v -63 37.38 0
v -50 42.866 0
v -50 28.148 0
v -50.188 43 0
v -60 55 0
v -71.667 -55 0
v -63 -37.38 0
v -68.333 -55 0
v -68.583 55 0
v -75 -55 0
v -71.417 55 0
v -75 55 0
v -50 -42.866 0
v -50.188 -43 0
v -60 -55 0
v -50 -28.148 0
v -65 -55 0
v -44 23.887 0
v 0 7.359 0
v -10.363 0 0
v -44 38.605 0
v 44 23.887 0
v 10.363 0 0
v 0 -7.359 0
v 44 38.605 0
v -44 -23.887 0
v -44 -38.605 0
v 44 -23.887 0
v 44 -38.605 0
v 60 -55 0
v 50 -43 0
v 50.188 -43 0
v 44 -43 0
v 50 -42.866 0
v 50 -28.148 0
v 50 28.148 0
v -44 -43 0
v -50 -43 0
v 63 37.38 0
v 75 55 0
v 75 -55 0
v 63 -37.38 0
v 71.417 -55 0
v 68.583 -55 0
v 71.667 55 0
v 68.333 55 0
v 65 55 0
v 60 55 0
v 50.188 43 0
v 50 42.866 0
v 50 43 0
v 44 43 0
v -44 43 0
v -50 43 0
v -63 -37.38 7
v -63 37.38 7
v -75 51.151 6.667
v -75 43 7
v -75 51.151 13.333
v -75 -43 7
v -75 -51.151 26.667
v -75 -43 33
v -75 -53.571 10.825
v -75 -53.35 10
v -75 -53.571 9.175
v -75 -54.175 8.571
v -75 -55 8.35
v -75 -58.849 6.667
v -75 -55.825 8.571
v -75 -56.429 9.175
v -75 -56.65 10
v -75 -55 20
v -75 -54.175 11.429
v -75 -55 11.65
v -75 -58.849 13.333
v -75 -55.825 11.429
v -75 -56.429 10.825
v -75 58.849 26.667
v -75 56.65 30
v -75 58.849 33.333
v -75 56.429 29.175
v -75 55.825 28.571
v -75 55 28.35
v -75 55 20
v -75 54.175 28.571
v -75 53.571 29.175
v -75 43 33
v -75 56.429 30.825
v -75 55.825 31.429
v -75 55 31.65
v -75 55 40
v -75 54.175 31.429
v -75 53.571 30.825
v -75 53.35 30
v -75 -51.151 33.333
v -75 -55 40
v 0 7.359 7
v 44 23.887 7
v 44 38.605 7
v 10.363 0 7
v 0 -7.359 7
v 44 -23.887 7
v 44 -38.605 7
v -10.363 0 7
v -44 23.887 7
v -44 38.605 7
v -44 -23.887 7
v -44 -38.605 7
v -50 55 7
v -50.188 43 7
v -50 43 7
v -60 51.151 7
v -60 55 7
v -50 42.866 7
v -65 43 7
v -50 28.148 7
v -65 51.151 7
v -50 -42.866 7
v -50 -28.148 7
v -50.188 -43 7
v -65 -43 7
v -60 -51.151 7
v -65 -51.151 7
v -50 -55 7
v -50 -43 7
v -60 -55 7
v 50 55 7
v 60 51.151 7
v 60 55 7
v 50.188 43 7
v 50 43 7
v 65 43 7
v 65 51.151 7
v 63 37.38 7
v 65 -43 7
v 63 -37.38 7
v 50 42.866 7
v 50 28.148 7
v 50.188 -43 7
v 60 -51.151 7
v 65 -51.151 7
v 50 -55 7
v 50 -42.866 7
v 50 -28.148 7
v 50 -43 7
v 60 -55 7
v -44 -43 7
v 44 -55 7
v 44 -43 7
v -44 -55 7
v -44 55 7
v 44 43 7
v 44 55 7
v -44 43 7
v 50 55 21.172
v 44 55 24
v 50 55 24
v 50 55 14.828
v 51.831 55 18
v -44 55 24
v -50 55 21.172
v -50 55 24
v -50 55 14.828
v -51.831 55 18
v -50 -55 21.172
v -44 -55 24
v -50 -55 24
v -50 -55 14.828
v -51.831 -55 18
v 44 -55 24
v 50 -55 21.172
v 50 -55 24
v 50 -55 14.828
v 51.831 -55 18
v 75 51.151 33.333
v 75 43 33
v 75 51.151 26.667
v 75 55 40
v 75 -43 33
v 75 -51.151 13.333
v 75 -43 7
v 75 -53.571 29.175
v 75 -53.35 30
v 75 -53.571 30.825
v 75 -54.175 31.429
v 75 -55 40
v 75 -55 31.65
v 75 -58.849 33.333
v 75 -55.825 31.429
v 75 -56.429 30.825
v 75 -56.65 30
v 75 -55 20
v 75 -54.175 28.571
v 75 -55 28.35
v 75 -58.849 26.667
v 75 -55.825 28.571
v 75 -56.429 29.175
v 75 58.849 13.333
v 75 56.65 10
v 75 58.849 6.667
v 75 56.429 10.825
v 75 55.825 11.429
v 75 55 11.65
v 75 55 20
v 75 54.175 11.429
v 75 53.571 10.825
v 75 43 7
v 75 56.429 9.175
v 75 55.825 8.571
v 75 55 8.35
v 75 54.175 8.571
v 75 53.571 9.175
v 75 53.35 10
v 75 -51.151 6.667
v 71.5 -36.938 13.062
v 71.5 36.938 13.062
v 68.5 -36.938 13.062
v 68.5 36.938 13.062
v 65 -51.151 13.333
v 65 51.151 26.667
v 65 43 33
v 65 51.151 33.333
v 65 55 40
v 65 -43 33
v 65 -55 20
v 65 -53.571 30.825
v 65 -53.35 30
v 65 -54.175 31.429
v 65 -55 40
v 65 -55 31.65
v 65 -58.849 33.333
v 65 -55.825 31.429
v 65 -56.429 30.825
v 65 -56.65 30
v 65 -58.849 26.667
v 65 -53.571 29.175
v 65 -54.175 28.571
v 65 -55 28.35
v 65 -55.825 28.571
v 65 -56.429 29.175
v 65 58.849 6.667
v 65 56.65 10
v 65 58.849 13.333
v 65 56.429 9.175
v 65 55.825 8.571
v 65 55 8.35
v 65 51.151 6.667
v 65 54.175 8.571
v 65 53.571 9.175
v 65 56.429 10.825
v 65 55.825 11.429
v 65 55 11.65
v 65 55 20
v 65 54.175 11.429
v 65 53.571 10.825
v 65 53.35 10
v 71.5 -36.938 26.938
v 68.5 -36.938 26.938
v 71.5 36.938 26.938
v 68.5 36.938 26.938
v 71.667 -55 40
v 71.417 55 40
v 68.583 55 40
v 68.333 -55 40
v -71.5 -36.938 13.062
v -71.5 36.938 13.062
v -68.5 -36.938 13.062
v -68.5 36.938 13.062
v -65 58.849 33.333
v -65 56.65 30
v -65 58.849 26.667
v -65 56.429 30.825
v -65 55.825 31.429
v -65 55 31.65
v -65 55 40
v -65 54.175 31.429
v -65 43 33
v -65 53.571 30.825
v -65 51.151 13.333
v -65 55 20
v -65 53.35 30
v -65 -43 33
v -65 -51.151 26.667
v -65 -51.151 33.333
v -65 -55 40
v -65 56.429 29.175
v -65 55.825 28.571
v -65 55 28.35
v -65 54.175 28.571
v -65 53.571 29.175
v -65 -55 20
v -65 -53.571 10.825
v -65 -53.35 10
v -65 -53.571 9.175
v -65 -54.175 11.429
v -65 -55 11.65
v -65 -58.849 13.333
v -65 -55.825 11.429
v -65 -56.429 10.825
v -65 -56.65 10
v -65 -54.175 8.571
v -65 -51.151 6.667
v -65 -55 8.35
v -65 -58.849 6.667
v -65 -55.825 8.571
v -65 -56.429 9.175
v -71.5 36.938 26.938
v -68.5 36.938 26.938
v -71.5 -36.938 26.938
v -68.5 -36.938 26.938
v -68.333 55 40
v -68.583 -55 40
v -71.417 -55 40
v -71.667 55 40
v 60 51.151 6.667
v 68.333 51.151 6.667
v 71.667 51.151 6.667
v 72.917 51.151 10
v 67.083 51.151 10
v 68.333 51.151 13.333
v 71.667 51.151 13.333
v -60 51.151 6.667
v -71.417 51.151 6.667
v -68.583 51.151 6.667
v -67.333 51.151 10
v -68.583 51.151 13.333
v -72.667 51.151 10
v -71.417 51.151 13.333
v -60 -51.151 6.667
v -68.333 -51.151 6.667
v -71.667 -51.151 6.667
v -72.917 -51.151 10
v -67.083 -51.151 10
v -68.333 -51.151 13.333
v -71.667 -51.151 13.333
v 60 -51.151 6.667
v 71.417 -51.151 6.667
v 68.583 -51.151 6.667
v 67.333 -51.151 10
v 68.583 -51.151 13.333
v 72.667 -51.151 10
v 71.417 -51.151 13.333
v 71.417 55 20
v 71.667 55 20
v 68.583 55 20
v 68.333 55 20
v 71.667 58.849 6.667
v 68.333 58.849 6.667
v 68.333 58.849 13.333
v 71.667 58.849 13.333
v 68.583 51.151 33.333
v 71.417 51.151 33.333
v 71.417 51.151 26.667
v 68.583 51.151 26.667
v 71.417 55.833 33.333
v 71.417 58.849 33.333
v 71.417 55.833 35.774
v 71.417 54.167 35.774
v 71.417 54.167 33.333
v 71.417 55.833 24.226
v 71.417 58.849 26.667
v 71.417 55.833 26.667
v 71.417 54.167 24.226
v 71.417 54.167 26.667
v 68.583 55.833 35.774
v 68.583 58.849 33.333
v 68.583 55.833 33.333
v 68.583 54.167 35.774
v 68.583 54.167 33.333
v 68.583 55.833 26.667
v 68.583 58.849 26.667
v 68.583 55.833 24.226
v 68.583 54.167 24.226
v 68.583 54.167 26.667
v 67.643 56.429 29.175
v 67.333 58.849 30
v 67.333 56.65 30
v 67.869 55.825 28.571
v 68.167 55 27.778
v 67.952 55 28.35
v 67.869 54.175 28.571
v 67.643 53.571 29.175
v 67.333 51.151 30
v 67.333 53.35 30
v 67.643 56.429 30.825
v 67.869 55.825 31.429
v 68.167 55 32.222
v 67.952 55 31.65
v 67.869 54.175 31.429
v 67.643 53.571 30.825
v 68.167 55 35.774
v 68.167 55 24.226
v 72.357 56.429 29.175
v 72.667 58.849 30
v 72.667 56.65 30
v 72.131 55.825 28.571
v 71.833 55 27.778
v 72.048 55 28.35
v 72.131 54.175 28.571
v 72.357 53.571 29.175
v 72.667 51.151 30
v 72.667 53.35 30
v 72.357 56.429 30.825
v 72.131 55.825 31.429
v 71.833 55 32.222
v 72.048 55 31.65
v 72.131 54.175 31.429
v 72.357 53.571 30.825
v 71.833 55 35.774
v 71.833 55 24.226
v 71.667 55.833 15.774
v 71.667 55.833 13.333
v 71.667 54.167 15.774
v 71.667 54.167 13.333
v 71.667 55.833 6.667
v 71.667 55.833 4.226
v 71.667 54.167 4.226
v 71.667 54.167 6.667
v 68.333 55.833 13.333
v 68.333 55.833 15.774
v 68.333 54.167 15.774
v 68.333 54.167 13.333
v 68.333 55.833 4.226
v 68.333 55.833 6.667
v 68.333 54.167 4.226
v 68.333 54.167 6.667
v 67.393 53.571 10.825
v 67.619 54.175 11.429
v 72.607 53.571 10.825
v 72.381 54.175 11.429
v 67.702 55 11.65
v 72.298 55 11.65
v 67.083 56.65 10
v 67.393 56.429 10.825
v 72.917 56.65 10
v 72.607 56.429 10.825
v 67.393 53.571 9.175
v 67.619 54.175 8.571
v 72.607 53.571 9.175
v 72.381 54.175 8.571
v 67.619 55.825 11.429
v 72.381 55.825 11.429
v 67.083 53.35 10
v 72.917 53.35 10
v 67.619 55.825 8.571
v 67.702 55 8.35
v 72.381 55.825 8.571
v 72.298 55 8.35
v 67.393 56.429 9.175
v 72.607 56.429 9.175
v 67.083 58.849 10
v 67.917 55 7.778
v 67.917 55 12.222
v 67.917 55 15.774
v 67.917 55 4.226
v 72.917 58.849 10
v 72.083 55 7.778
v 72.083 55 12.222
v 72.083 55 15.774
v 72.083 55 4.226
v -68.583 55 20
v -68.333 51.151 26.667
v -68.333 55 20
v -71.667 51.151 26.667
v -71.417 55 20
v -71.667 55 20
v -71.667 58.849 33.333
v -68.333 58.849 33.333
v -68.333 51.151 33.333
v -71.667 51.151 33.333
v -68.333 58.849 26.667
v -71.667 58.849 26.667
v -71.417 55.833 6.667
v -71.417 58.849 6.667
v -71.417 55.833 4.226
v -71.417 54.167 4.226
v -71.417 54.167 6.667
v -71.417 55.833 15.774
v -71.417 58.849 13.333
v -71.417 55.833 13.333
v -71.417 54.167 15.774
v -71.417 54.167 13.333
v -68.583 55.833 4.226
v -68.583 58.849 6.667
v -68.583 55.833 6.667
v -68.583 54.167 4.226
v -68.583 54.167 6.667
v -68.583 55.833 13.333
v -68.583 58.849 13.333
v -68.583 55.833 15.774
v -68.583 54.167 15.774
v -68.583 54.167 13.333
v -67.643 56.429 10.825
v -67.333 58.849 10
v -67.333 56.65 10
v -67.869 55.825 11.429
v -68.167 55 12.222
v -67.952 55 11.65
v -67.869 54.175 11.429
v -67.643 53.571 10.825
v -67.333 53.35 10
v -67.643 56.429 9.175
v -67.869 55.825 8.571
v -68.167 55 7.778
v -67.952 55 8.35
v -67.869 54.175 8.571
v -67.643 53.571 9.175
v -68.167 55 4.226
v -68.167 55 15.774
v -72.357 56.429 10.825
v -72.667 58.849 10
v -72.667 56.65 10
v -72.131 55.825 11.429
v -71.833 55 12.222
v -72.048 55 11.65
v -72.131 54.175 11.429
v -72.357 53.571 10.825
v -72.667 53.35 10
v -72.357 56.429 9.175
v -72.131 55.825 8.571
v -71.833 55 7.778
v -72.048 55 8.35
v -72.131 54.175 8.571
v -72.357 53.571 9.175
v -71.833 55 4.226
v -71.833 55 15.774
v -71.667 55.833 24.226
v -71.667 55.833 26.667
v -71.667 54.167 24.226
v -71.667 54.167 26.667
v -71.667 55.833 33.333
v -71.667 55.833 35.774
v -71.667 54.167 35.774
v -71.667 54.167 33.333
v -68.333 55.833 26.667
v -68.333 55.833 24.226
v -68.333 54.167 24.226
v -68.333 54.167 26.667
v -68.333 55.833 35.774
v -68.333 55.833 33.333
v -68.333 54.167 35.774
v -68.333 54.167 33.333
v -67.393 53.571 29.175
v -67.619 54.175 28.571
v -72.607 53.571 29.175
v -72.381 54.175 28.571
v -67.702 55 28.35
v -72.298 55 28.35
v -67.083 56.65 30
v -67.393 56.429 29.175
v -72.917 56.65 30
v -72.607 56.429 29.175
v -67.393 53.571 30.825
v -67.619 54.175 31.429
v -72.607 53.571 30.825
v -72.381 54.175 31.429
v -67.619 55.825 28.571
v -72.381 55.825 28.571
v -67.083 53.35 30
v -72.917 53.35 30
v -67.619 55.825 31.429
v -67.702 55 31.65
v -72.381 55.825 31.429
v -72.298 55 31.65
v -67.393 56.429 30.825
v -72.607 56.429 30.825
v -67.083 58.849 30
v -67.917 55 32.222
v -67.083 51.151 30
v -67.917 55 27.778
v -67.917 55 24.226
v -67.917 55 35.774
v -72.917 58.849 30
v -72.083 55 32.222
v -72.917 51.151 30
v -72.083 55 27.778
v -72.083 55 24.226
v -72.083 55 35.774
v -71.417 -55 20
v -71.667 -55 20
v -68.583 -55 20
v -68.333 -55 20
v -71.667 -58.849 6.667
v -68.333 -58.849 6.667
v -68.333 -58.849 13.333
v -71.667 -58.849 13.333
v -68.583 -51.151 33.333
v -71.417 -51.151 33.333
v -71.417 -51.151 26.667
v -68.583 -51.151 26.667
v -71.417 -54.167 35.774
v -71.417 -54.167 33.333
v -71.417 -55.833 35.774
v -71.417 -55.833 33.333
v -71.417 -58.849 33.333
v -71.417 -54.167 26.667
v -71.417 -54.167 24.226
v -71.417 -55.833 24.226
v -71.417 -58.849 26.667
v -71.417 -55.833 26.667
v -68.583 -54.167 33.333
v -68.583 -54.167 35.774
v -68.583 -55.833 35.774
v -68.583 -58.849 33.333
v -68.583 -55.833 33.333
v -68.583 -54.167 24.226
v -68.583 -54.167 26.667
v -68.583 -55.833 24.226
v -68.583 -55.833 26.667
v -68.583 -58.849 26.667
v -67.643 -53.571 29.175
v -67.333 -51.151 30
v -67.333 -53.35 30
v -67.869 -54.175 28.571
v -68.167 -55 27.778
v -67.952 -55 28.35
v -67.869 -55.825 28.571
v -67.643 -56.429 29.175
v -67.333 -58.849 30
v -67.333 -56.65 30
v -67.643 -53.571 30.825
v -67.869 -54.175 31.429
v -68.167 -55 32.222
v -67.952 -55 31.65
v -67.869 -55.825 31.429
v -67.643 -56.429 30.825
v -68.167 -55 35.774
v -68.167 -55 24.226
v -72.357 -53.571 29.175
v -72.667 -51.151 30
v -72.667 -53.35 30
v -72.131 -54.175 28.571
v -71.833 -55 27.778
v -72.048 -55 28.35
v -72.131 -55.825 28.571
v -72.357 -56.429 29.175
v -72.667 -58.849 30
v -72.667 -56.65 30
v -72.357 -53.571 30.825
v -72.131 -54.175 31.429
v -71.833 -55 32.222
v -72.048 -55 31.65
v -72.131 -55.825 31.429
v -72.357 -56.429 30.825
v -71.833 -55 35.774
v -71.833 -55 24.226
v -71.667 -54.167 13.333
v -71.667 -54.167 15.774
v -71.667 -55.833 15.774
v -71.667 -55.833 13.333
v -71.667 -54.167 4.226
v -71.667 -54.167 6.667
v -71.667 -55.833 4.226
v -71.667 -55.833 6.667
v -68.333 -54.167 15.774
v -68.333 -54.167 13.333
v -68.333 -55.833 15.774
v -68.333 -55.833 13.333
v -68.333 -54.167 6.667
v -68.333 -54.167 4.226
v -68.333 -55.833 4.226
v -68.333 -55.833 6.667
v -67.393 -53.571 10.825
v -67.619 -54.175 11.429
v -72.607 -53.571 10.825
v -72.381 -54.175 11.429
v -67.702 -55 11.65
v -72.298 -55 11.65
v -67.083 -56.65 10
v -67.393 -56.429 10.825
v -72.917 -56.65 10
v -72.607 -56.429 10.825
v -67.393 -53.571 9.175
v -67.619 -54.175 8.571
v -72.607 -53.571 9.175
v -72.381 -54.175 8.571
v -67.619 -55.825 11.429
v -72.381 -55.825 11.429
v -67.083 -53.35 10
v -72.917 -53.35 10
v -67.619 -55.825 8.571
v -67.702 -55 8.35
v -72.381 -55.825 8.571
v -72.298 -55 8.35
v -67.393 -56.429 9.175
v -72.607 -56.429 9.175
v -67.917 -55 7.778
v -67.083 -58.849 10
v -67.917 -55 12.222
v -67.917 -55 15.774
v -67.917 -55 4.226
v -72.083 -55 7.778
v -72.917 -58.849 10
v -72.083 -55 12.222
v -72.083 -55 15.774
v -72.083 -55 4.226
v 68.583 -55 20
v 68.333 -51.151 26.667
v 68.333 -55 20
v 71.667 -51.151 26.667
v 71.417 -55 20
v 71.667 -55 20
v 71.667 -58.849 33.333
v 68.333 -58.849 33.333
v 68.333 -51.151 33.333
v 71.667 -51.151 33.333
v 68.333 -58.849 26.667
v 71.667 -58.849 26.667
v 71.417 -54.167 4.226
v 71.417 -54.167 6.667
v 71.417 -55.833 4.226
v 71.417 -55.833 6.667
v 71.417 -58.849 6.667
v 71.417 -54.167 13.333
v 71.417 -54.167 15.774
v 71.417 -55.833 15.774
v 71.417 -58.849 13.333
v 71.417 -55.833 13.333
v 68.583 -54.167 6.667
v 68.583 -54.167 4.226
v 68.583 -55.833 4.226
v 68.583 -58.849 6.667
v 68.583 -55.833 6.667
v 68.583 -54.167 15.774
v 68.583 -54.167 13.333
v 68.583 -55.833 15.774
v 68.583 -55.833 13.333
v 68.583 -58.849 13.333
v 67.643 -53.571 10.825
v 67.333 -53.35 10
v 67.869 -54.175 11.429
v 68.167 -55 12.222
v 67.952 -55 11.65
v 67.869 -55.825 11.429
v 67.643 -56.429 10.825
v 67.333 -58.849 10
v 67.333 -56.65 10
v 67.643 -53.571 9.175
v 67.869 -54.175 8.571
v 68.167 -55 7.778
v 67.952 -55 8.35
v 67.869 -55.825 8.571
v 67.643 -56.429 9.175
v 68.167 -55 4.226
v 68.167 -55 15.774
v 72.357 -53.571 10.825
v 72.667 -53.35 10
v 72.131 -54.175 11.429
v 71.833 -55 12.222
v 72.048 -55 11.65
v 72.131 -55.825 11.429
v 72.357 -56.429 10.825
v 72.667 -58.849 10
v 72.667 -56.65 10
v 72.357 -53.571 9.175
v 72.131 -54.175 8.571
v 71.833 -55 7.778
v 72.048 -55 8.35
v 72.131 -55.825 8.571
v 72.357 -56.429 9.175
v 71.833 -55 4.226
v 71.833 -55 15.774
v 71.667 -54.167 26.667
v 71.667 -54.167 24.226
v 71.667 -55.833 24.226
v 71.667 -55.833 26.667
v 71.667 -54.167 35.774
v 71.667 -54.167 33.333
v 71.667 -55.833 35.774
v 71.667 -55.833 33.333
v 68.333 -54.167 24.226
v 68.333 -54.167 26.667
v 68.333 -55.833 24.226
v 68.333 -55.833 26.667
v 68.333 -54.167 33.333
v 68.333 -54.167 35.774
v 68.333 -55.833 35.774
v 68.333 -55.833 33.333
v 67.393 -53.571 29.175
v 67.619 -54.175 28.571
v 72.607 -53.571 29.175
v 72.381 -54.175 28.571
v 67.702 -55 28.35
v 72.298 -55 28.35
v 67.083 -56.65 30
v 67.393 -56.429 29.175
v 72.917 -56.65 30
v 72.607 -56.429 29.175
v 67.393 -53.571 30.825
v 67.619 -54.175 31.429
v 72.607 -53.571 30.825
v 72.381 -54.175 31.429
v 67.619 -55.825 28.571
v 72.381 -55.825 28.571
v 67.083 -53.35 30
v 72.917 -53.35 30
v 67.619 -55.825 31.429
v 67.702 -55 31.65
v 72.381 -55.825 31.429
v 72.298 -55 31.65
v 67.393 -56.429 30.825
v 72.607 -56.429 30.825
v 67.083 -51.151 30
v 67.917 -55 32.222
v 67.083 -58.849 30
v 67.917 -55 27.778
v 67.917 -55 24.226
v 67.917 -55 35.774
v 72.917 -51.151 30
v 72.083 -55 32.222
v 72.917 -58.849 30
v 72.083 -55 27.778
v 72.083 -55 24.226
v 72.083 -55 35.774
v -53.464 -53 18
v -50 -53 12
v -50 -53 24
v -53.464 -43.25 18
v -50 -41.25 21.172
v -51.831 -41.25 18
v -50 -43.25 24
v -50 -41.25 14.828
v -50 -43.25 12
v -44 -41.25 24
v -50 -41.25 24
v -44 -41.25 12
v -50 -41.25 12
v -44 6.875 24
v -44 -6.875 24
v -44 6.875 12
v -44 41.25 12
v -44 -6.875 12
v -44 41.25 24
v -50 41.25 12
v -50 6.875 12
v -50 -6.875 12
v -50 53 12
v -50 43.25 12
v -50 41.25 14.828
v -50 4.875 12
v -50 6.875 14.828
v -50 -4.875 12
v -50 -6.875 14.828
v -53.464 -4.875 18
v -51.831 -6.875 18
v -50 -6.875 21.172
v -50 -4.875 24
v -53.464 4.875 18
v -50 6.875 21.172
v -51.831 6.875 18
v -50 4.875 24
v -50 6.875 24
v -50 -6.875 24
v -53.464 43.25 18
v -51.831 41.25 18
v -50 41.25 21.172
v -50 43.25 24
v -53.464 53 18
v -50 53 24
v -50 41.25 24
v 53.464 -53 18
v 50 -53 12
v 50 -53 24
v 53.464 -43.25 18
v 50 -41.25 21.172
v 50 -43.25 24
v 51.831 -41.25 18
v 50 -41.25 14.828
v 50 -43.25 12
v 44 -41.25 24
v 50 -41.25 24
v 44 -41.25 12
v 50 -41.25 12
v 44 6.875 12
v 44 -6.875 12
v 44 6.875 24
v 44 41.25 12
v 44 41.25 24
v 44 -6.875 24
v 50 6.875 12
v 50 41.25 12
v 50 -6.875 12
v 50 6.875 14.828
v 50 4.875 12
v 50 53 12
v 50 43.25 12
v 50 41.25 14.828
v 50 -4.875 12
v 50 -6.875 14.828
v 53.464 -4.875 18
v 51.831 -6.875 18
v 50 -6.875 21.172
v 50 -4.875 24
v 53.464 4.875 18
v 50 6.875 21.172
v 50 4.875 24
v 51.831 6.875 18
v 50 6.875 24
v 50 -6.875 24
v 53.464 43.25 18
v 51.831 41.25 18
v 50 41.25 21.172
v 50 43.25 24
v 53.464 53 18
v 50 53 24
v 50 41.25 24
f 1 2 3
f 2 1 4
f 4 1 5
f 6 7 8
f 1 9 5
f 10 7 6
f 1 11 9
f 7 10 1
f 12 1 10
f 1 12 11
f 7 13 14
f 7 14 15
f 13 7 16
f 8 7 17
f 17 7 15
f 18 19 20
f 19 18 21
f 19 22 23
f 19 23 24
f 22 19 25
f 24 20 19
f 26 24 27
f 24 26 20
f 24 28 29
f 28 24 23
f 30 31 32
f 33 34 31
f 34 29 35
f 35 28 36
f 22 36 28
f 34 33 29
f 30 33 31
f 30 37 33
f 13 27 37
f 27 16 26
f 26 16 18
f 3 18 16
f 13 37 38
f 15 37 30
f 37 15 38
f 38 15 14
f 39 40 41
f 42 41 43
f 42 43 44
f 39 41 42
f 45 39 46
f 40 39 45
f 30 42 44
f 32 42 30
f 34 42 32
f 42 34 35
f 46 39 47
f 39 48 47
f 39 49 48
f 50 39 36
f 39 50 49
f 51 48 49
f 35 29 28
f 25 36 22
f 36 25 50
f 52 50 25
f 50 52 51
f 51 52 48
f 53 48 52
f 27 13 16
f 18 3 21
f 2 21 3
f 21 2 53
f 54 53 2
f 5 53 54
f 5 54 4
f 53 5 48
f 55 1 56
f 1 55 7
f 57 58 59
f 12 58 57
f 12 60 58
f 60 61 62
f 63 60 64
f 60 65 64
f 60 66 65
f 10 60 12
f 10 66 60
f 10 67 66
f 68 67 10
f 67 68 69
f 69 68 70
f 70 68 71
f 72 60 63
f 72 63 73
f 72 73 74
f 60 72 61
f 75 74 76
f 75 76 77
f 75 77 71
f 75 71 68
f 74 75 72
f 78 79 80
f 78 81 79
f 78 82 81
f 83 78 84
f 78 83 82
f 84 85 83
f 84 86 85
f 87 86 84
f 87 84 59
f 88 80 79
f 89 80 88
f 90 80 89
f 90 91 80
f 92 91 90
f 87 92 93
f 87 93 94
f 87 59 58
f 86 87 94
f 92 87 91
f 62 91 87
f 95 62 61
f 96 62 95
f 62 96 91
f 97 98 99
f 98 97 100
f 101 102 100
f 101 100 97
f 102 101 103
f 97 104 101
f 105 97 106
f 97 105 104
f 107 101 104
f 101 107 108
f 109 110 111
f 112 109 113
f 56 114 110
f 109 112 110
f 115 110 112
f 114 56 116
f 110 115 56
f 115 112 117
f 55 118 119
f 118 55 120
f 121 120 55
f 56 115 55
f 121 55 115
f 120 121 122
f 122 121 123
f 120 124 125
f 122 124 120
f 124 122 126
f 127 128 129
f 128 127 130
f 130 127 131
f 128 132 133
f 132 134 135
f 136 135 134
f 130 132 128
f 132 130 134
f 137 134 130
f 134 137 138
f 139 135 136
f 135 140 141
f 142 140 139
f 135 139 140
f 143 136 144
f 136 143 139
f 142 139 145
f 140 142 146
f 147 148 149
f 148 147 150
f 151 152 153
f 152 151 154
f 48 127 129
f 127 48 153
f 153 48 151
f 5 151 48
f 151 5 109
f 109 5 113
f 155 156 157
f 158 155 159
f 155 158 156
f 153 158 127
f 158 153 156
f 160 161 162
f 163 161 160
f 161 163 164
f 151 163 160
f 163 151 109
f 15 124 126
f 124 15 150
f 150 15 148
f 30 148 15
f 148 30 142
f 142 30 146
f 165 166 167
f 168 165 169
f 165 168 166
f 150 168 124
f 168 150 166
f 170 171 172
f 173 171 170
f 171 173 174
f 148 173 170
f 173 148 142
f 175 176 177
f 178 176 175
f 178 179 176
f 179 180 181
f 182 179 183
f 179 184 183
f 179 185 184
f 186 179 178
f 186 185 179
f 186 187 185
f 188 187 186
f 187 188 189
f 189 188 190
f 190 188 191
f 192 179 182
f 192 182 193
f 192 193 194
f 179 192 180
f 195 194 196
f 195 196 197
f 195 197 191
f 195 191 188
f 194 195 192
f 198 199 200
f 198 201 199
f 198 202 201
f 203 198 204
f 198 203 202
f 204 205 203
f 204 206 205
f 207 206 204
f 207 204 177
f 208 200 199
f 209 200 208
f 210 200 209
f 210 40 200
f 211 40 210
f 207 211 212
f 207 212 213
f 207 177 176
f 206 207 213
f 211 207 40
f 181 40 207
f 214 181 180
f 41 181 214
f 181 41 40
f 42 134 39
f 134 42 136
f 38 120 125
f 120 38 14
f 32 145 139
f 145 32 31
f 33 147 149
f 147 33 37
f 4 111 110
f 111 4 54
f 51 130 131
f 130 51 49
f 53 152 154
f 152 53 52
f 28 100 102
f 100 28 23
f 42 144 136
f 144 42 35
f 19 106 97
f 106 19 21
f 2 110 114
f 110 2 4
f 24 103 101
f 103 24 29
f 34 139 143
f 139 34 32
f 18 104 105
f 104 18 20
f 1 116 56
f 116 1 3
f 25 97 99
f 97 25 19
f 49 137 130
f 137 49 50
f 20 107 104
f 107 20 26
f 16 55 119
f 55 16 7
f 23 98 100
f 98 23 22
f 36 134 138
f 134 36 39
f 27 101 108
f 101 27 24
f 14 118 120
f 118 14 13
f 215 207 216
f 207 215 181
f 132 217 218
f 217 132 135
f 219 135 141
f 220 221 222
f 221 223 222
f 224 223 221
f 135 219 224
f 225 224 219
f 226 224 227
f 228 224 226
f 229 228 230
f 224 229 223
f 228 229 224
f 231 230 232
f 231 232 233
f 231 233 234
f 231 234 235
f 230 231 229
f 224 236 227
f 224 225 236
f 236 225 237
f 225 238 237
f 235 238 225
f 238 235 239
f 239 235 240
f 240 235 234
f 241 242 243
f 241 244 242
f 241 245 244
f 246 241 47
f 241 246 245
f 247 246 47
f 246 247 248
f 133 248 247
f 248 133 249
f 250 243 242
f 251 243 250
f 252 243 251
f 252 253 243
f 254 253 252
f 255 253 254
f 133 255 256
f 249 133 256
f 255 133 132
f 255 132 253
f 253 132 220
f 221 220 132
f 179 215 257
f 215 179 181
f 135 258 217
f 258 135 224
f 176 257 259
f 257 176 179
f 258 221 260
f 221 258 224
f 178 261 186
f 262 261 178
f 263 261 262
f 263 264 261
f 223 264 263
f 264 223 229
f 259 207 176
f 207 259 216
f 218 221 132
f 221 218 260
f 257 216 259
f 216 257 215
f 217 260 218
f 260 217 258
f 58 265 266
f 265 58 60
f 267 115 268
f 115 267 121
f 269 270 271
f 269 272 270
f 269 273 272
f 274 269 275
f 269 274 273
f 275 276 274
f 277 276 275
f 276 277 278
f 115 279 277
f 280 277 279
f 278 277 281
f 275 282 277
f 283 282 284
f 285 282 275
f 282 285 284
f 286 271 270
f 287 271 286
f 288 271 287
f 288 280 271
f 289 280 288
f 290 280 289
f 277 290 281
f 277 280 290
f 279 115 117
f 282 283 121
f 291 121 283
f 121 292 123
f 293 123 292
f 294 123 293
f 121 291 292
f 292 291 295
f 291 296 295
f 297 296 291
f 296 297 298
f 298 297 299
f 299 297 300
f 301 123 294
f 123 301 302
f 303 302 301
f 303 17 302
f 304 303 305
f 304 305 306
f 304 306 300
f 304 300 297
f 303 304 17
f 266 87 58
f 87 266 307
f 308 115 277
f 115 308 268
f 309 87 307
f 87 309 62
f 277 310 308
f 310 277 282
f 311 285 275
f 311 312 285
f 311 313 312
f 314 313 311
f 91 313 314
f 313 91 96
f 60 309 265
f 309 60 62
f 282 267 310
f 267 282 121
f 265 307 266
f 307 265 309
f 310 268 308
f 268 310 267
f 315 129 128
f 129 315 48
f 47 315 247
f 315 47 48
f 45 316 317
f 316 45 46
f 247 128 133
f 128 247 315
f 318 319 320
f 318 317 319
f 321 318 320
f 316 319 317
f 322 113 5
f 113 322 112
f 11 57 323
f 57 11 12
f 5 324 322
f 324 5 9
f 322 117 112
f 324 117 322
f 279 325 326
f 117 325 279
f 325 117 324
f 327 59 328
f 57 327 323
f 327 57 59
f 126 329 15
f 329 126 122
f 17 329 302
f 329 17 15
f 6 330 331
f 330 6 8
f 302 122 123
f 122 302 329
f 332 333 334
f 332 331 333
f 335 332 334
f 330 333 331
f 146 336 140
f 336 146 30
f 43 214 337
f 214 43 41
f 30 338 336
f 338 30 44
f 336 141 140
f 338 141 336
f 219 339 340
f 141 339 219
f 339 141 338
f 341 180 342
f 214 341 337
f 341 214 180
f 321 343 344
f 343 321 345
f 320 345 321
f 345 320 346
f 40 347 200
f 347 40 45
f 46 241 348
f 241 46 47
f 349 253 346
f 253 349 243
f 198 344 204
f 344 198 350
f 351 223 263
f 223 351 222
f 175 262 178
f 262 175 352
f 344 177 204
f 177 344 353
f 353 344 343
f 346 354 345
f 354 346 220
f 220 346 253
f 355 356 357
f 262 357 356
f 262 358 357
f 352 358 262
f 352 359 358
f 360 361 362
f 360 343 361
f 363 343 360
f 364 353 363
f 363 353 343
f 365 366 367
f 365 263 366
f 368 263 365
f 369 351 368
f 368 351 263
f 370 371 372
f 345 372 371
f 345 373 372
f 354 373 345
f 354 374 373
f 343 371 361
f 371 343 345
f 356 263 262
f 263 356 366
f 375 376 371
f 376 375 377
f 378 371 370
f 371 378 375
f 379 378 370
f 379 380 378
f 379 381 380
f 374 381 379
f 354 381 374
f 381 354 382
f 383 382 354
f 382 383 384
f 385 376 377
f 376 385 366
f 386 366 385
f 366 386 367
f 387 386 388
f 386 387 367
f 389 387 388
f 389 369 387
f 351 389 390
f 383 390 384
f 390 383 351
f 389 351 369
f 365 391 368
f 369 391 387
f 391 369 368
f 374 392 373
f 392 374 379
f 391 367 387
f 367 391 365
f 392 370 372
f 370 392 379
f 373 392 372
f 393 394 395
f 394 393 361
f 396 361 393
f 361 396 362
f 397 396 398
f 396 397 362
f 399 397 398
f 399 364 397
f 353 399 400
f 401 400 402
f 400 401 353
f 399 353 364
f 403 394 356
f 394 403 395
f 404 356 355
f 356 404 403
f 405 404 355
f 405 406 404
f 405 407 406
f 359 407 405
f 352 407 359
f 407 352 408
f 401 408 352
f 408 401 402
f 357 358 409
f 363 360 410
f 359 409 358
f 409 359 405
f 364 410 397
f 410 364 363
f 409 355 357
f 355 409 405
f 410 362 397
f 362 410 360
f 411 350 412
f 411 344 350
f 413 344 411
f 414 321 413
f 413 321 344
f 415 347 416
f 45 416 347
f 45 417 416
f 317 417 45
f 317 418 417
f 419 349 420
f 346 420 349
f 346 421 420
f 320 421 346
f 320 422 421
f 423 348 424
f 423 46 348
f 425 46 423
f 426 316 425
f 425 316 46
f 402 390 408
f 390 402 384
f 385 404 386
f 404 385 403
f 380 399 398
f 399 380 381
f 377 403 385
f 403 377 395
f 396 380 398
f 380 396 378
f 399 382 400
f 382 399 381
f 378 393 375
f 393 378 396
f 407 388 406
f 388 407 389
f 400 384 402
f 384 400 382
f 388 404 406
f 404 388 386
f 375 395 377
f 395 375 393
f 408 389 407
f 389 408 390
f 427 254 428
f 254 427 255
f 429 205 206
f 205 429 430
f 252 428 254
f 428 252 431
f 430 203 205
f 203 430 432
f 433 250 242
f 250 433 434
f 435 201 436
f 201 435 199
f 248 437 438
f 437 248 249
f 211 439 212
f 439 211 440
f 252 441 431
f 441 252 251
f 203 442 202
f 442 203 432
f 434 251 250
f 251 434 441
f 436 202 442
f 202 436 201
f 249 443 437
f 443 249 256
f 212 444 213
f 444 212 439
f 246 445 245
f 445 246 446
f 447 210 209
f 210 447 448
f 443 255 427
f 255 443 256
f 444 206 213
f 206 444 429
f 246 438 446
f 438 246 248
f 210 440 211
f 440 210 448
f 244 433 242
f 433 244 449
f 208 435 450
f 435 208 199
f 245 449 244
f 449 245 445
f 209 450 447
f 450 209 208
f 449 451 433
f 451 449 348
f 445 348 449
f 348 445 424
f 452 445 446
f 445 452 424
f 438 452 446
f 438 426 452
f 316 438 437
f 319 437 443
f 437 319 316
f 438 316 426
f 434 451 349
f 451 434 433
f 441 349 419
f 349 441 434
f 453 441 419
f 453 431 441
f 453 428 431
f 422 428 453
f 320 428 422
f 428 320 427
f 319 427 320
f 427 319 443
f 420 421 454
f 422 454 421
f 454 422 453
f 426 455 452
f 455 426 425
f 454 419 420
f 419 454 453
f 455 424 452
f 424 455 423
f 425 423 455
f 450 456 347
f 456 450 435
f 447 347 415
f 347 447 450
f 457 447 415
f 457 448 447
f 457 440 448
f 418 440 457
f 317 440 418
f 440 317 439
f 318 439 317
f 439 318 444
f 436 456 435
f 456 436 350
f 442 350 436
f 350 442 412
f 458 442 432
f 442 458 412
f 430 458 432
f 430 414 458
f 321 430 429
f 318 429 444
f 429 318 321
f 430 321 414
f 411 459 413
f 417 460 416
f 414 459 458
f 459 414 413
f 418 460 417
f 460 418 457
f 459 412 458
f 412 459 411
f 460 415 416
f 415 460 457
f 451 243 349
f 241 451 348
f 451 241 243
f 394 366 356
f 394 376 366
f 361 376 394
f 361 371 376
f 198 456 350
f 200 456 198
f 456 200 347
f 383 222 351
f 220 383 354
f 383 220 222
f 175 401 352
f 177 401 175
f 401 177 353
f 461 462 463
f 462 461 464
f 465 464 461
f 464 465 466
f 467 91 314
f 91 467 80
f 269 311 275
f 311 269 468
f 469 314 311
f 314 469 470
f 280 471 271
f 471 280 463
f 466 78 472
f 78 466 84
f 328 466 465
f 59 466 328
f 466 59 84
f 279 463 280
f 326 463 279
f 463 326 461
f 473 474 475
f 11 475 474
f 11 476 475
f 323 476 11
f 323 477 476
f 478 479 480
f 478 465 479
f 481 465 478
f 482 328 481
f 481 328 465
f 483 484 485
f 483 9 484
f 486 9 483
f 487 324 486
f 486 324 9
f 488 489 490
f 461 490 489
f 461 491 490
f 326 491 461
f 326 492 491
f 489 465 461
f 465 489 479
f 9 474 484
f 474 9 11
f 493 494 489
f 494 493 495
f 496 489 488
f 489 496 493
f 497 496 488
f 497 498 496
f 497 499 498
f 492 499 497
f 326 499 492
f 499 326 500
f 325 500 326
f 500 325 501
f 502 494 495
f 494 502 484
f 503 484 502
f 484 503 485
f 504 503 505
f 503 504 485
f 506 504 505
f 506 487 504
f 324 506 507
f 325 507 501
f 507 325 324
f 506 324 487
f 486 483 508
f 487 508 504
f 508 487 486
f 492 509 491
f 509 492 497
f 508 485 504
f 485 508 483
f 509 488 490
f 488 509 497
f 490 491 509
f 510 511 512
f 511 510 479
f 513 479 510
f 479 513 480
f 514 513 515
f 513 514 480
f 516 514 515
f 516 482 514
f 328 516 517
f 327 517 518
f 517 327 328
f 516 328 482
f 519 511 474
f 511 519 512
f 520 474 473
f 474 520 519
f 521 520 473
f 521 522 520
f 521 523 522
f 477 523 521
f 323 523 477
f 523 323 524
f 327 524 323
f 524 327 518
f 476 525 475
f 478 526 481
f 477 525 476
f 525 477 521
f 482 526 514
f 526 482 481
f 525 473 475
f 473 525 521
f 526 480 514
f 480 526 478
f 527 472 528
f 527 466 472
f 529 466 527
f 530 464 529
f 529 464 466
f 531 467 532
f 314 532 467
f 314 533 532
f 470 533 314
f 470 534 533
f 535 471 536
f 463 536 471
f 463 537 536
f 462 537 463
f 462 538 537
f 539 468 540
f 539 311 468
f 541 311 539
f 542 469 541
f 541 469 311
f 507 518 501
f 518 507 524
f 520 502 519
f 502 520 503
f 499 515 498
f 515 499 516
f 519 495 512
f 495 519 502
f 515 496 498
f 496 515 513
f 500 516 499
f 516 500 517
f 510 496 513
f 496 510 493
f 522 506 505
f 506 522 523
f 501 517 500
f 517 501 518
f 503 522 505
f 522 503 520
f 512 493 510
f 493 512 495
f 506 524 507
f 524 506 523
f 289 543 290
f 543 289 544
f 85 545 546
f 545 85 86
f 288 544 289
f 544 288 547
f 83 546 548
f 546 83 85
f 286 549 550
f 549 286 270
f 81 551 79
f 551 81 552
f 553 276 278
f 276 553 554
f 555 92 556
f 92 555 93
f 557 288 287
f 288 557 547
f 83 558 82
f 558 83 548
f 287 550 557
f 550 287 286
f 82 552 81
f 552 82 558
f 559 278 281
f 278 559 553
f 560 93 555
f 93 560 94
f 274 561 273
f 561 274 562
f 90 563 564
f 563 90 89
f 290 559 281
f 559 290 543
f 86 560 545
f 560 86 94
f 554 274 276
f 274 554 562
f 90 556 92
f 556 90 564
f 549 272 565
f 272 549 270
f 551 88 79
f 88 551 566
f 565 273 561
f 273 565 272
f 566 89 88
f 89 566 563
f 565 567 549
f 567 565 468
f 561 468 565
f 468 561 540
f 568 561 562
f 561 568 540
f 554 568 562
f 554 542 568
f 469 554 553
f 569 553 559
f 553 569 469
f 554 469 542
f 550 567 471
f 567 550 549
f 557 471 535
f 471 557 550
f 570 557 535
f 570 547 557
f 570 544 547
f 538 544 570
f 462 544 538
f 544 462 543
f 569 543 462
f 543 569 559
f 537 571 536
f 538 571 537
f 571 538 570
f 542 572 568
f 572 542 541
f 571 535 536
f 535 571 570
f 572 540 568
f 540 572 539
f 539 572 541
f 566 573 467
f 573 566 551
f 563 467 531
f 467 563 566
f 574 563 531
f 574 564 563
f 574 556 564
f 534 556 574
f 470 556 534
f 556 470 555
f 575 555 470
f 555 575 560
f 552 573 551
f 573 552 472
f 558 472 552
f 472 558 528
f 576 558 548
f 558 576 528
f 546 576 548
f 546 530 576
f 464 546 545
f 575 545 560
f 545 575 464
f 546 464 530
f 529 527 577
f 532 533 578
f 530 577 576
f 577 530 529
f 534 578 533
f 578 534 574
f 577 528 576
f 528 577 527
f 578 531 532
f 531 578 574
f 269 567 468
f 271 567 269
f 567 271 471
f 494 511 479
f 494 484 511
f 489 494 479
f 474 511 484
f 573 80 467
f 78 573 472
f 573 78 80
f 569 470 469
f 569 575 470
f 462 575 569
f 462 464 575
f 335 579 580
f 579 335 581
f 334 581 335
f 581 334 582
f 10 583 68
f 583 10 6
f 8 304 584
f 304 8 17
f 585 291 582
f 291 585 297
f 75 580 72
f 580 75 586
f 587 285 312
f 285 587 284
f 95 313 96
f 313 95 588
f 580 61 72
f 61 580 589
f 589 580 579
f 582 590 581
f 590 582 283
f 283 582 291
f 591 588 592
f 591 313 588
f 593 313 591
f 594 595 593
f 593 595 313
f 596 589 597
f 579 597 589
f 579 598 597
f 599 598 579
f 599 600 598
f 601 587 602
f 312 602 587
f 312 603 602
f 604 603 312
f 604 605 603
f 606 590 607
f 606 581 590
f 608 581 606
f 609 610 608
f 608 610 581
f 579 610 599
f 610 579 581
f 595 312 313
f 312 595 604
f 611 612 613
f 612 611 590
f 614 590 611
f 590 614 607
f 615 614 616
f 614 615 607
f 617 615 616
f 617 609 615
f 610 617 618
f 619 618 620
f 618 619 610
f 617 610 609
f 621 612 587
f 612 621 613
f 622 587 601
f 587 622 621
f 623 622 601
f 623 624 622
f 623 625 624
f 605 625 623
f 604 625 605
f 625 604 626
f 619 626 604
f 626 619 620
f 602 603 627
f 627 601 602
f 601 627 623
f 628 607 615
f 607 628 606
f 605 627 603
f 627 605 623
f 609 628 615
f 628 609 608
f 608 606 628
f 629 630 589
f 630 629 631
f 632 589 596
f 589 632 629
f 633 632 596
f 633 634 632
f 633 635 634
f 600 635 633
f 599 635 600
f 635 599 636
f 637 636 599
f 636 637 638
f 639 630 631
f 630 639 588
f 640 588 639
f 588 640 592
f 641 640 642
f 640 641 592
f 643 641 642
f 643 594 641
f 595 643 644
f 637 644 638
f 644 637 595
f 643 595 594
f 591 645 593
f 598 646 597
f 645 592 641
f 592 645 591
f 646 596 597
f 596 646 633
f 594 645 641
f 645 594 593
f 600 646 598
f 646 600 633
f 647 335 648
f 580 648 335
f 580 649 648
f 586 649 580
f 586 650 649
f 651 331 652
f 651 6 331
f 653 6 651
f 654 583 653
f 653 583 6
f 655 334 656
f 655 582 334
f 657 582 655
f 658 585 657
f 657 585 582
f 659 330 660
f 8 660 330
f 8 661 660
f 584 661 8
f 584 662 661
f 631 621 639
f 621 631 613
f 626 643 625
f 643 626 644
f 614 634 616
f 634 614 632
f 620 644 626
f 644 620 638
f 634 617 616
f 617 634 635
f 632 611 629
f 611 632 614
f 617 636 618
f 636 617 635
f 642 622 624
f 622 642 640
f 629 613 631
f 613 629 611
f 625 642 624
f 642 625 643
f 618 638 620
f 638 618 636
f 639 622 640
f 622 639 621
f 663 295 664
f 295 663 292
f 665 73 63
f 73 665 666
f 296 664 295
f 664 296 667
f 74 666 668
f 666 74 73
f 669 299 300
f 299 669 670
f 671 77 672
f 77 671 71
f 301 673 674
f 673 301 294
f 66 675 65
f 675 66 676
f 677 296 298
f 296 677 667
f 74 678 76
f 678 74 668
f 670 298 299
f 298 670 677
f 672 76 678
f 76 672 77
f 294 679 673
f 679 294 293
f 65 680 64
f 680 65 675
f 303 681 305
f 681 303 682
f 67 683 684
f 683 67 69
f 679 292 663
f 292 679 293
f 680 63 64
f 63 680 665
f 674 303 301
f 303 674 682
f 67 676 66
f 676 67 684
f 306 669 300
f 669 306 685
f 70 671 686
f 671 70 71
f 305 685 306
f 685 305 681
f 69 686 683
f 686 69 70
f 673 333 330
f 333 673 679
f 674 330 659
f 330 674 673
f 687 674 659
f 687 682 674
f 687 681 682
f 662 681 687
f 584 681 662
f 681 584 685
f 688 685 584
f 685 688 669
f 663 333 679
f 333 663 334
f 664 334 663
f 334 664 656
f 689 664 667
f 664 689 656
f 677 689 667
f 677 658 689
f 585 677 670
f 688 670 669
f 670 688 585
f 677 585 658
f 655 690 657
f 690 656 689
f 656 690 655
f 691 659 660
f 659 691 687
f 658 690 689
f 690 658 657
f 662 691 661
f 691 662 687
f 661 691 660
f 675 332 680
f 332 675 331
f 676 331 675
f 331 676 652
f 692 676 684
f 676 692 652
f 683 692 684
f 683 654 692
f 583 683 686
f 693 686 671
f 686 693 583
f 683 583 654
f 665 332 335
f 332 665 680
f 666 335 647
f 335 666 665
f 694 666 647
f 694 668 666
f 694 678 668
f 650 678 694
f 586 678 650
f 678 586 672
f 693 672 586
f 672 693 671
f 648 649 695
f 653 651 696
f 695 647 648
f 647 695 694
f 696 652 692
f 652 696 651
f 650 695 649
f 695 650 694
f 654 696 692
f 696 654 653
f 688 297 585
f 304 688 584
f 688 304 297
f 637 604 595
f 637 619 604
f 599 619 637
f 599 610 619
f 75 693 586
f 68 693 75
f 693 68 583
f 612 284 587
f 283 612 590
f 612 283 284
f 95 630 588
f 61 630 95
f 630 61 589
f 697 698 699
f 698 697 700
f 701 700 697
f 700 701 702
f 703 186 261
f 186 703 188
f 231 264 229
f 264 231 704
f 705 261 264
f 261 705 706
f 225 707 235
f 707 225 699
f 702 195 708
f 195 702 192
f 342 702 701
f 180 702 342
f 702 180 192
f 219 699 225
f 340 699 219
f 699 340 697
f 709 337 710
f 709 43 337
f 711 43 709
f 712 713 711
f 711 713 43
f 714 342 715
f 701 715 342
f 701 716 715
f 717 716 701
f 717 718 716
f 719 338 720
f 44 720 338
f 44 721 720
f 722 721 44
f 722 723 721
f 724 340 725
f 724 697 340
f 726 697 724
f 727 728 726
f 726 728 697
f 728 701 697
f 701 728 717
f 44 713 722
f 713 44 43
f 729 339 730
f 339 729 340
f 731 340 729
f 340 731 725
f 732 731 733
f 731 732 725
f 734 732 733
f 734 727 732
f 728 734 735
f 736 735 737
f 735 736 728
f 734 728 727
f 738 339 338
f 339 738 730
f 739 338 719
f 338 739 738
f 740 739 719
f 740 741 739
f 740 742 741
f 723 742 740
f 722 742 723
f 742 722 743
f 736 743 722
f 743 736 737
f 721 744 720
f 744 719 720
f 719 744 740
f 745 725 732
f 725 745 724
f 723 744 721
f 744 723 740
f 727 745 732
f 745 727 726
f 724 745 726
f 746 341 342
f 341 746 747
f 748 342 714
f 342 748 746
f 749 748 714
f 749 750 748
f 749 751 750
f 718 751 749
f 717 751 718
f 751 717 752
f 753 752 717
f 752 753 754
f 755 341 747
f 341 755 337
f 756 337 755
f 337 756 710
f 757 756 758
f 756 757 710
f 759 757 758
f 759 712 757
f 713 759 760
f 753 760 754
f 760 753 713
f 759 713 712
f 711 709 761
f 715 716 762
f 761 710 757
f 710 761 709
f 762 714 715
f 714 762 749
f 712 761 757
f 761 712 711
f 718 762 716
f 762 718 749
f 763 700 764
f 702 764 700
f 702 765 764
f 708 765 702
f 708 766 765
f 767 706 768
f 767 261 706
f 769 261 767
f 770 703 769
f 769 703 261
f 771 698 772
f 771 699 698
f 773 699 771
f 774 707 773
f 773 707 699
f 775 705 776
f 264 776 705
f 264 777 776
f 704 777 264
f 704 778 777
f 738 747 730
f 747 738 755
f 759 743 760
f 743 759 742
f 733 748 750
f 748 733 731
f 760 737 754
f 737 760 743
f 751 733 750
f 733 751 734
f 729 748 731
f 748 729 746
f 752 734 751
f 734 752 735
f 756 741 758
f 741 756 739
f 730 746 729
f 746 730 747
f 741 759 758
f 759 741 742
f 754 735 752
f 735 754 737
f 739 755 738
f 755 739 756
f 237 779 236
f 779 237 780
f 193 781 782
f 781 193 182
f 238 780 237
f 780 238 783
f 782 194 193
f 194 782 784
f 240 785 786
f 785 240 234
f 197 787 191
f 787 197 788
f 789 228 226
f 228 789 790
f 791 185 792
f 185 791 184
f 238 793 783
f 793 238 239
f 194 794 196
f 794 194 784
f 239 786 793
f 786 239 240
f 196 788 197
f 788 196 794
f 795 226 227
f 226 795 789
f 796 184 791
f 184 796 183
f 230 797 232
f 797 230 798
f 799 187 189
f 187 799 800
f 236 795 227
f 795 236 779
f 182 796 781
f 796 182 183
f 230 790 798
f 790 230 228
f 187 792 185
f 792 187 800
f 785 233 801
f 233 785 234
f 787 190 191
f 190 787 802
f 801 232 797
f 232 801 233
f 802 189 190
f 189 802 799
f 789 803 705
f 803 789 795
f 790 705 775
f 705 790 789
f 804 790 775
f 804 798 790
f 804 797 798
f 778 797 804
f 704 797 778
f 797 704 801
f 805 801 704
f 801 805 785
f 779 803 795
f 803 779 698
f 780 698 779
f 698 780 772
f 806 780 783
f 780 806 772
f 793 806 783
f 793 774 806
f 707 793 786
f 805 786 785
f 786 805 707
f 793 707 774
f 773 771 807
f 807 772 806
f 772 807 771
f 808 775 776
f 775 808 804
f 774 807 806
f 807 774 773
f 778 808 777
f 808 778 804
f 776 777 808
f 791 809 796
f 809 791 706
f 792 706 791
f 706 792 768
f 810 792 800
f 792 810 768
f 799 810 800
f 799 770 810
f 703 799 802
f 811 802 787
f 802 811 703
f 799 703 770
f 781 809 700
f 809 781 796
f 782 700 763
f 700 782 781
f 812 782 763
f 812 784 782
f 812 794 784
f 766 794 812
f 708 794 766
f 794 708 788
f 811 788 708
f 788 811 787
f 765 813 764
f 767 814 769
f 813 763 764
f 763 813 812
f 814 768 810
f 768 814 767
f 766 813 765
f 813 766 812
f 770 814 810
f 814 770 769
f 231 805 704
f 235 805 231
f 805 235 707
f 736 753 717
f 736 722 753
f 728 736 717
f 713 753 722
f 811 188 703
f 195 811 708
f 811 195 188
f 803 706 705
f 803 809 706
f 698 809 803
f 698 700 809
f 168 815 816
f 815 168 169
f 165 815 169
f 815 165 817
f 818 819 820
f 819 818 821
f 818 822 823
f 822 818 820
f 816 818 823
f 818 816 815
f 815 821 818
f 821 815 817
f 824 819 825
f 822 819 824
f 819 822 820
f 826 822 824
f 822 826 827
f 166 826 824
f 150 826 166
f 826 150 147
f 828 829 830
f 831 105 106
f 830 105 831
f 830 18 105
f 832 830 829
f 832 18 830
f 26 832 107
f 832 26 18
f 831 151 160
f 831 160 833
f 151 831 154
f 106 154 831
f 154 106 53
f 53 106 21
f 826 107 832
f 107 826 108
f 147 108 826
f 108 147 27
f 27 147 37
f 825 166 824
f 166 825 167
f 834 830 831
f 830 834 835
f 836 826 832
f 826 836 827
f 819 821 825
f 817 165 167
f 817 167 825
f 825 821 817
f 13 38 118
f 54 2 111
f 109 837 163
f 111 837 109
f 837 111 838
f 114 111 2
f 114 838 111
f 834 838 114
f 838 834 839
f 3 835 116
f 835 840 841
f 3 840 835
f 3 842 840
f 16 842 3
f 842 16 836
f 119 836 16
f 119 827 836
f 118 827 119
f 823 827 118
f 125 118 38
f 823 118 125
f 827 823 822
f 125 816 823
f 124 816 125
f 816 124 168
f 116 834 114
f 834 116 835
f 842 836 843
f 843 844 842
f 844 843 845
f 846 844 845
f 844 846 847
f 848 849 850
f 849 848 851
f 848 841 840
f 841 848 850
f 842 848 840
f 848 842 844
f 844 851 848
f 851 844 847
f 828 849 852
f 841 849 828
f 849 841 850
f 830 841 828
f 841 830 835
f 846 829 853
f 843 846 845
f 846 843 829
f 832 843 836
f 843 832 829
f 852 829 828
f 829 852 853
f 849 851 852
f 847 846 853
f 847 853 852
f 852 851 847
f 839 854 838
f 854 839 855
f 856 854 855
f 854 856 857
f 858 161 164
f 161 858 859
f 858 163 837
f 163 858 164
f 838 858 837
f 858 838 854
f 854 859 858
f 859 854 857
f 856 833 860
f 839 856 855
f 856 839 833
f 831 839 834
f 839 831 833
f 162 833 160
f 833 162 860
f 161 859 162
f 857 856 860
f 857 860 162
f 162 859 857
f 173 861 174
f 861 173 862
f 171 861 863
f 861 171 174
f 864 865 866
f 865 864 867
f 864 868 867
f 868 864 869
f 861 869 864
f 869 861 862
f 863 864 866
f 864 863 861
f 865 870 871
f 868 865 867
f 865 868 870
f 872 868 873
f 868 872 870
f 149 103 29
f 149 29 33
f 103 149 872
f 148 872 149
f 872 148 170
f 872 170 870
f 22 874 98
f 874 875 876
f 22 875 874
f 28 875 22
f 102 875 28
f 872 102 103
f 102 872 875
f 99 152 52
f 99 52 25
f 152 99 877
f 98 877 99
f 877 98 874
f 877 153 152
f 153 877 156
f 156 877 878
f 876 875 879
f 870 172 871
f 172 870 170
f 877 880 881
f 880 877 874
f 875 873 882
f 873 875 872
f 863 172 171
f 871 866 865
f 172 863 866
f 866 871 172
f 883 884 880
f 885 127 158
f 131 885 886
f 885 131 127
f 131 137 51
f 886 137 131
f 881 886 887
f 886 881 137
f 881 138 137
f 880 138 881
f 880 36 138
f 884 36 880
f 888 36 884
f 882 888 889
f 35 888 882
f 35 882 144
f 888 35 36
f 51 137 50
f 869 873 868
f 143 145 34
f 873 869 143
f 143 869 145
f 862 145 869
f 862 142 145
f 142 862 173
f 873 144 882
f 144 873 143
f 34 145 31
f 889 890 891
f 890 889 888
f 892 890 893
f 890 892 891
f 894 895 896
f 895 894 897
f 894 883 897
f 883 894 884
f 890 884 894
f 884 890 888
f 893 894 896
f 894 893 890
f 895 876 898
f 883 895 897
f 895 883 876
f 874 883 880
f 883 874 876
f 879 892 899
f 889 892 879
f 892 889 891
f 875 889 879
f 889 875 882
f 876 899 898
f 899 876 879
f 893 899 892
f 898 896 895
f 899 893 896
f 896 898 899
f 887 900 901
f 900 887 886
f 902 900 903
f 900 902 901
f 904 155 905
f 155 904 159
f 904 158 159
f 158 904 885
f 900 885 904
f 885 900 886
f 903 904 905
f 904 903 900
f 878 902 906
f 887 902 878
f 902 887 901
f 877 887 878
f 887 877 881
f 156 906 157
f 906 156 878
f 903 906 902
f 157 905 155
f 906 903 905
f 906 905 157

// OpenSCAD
// file: joiners.scad
include <config.scad>
use <GDMUtils.scad>


module joiner(h=40, w=10, l=10, a=30, screwsize=3, guides=true, slop=printer_slop)
{
	dmnd_height = h/2;
	dmnd_width = dmnd_height*tan(a);
	guide_size = w/3;
	tip_off = 2+dmnd_width/2-guide_size*tan(a);

	render(convexity=4) union() {
		difference() {
			union() {
				// Make base.
				difference() {
					union() {
						translate([0,-l/2,0]) cube(size=[w, l, h], center=true);
						translate([0,0,-h/4])
							scale([w, dmnd_width/2, dmnd_height/2])
								xrot(45) cube(size=[1,sqrt(2),sqrt(2)], center=true);
					}
					translate([0,0,h/4])
						scale([w*1.1, dmnd_width/2, dmnd_height/2])
							xrot(45) cube(size=[1,sqrt(2),sqrt(2)], center=true);
				}

				// Make tab
				translate([0,0,dmnd_height/2]) {
					translate([0, -dmnd_width/4, 0])
						cube(size=[w/3-slop*2, dmnd_width/2, dmnd_height], center=true);
					scale([w/3-slop*2, dmnd_width/2, dmnd_height/2]) xrot(45)
						cube(size=[1,sqrt(2),sqrt(2)], center=true);
				}

				// Guide ridges.
				if (guides == true) {
					translate([0,0,dmnd_height/2]) {
						grid_of(xa=[-(w/6-slop), (w/6-slop)]) {
							// Guide ridge.
							scale([0.75, 1, 2]) yrot(45)
								cube(size=[guide_size/sqrt(2), dmnd_width, guide_size/sqrt(2)], center=true);

							// Snap ridge.
							scale([0.25, 0.5, 1]) zrot(45)
								cube(size=[guide_size/sqrt(2), guide_size/sqrt(2), dmnd_width], center=true);
						}
					}
				}
			}

			// Make slot
			translate([0, 0, -dmnd_height/2]) {
				translate([0, dmnd_width/4, 0])
					cube(size=[w/3, dmnd_width/2, dmnd_height], center=true);
				scale([w/3, dmnd_width/2, dmnd_height/2]) xrot(45)
					cube(size=[1,sqrt(2),sqrt(2)], center=true);
			}

			// Blunt point of tab.
			translate([0,tip_off,0])
				cube(size=[w*1.1,4,h], center=true);

			// Make screwholes, if needed.
			if (screwsize != undef) {
				xrot_copies([0, 180])
					translate([0, 0, dmnd_height/2])
						yrot(90) cylinder(r=screwsize*1.1/2, h=w+1, center=true, $fn=12);
			}

			// Guide slots.
			if (guides == true) {
				translate([0,0,-dmnd_height/2]) {
					grid_of(xa=[-(w/6),(w/6)]) {
						// Guide slot
						scale([0.75, 1, 2]) yrot(45)
							cube(size=[guide_size/sqrt(2), dmnd_width*1.1, guide_size/sqrt(2)], center=true);

						// Snap hole
						scale([0.25, 0.5, 1]) zrot(45)
							cube(size=[guide_size/sqrt(2), guide_size/sqrt(2), dmnd_width], center=true);
					}
				}
			}
		}

		// Blunt point of slot.
		translate([0,-tip_off,0])
			cube(size=[w,4,h], center=true);
	}
}
//joiner(screwsize=3);



module joiner_clear(h=40, w=10, a=30)
{
	dmnd_height = h/2;
	dmnd_width = dmnd_height*tan(a);
	guide_size = w/3;
	tip_off = 2+dmnd_width/2-guide_size*tan(a);

	difference() {
		// Diamonds.
		grid_of(za=[-h/4,h/4]) {
			scale([w+10, dmnd_width/2, dmnd_height/2]) {
				xrot(45) cube(size=[1,sqrt(2),sqrt(2)], center=true);
			}
		}
		// Blunt point of tab.
		grid_of(ya=[-tip_off, tip_off]) {
			cube(size=[w+10+1, 4, h], center=true);
		}
	}
}
//joiner_clear();



module joiner_pair(spacing=100, h=40, w=10, l=10, a=30, screwsize=3, guides=true)
{
	yrot_copies([0,180]) {
		translate([spacing/2, 0, 0]) {
			joiner(h=h, w=w, l=l, a=a, screwsize=screwsize, guides=guides);
		}
	}
}



module joiner_pair_clear(spacing=100, h=40, w=10, a=30)
{
	yrot_copies([0,180]) {
		translate([spacing/2, 0, 0]) {
			joiner_clear(h=h, w=w, a=a);
		}
	}
}



module joiner_quad(xspacing=100, yspacing=50, h=40, w=10, l=10, a=30, screwsize=3, guides=true)
{
	zrot_copies([0,180]) {
		translate([0, yspacing/2, 0]) {
			joiner_pair(spacing=xspacing, h=h, w=w, l=l, a=a, screwsize=screwsize, guides=guides);
		}
	}
}



module joiner_quad_clear(xspacing=100, yspacing=50, h=40, w=10, a=30)
{
	zrot_copies([0,180]) {
		translate([0, yspacing/2, 0]) {
			joiner_pair_clear(spacing=xspacing, h=h, w=w, a=a);
		}
	}
}



// vim: noexpandtab tabstop=4 shiftwidth=4 softtabstop=4 nowrap
// file: config.scad
snappy_version = 0.90;


platform_length = 110; // mm.  Must be a multiple of rack_tooth_size.
platform_width  = 150; // mm
platform_height =  40; // mm
platform_thick  =   7; // mm

rail_length   = 150;    // mm
rail_height   =  50;    // mm
rail_thick    =   7;    // mm
rail_offset   =  12;    // mm

motor_rail_length = 100; // mm

groove_angle  =  30;    // degrees
groove_height =  12;    // mm

joiner_angle  =  30;    // degrees
joiner_width  =  10;    // mm

rack_tooth_size  =  5; // mm per tooth.
set_screw_size   =  3; // mm size of set screw in drive gears, couplers, etc
motor_shaft_size =  5; // mm
motor_shaft_flatted = false;  // boolean

// Currently configured for 3/8" ACME threaded rod and matching 11/16" nut
lifter_rod_diam   =   9.5; // mm
lifter_rod_length = 300.0; // mm
lifter_nut_size   =  17.4; // mm
lifter_nut_thick  =   9.3; // mm
lifter_thread_size =  3.175; // mm lift per revolution

endstop_hole_spacing = 19; // mm
endstop_screw_size   =  3; // mm

// This is the slop needed to make parts fit more exactly, and may be
// printer dependant.  Printing a slop calibration plate should help
// dial this setting in for your printer.
printer_slop =   0.25; // mm



// Commonly used derived values.  Don't change these.
rail_spacing = platform_width - joiner_width*4 - 10;
rail_width = rail_spacing + joiner_width*2;



// vim: noexpandtab tabstop=4 shiftwidth=4 softtabstop=4 nowrap
// main file
include <config.scad>
use <GDMUtils.scad>
use <joiners.scad>



module slider_sled()
{
	union() {
		difference() {
			union() {
				// Bottom strut.
				translate([0,0,platform_thick/2])
					yrot(90) sparse_strut(h=platform_width, l=platform_length, thick=platform_thick, maxang=45, strut=12, max_bridge=999);

				// Solid walls.
				zrot_copies([0, 180]) {
					translate([(platform_width-joiner_width)/2, 0, platform_height/2]) {
						thinning_wall(h=platform_height, l=platform_length-10, thick=joiner_width, strut=platform_thick, wall=3, bracing=false);
					}
				}
			}

			// Clear space for joiners.
			translate([0,0,platform_height/2]) {
				joiner_quad_clear(xspacing=platform_width-joiner_width, yspacing=platform_length, h=platform_height, w=joiner_width, a=joiner_angle);
			}
		}

		// Snap-tab joiners.
		translate([0,0,platform_height/2]) {
			joiner_quad(xspacing=platform_width-joiner_width, yspacing=platform_length, h=platform_height, w=joiner_width, l=5, a=joiner_angle);
		}

		mirror_copy([1,0,0]) {
			// slider ridges.
			translate([-(rail_spacing)/2, 0, 0]) {
				translate([6/2,0,rail_offset/2])
					cube(size=[6, platform_length, rail_offset], center=true);
				grid_of(
					ya=[-platform_length*7/16, 0, platform_length*7/16],
					za=[rail_offset+groove_height/2]
				) {
					translate([6/2,0,0])
						cube(size=[6, platform_length/8, groove_height], center=true);
					scale([tan(groove_angle),1,1]) {
						yrot(45) {
							chamfcube(size=[groove_height/sqrt(2), platform_length/8, groove_height/sqrt(2)], chamfer=2, chamfaxes=[1,0,1], center=true);
						}
					}
				}
			}
		}
	}
}



slider_sled();



// vim: noexpandtab tabstop=4 shiftwidth=4 softtabstop=4 nowrap
